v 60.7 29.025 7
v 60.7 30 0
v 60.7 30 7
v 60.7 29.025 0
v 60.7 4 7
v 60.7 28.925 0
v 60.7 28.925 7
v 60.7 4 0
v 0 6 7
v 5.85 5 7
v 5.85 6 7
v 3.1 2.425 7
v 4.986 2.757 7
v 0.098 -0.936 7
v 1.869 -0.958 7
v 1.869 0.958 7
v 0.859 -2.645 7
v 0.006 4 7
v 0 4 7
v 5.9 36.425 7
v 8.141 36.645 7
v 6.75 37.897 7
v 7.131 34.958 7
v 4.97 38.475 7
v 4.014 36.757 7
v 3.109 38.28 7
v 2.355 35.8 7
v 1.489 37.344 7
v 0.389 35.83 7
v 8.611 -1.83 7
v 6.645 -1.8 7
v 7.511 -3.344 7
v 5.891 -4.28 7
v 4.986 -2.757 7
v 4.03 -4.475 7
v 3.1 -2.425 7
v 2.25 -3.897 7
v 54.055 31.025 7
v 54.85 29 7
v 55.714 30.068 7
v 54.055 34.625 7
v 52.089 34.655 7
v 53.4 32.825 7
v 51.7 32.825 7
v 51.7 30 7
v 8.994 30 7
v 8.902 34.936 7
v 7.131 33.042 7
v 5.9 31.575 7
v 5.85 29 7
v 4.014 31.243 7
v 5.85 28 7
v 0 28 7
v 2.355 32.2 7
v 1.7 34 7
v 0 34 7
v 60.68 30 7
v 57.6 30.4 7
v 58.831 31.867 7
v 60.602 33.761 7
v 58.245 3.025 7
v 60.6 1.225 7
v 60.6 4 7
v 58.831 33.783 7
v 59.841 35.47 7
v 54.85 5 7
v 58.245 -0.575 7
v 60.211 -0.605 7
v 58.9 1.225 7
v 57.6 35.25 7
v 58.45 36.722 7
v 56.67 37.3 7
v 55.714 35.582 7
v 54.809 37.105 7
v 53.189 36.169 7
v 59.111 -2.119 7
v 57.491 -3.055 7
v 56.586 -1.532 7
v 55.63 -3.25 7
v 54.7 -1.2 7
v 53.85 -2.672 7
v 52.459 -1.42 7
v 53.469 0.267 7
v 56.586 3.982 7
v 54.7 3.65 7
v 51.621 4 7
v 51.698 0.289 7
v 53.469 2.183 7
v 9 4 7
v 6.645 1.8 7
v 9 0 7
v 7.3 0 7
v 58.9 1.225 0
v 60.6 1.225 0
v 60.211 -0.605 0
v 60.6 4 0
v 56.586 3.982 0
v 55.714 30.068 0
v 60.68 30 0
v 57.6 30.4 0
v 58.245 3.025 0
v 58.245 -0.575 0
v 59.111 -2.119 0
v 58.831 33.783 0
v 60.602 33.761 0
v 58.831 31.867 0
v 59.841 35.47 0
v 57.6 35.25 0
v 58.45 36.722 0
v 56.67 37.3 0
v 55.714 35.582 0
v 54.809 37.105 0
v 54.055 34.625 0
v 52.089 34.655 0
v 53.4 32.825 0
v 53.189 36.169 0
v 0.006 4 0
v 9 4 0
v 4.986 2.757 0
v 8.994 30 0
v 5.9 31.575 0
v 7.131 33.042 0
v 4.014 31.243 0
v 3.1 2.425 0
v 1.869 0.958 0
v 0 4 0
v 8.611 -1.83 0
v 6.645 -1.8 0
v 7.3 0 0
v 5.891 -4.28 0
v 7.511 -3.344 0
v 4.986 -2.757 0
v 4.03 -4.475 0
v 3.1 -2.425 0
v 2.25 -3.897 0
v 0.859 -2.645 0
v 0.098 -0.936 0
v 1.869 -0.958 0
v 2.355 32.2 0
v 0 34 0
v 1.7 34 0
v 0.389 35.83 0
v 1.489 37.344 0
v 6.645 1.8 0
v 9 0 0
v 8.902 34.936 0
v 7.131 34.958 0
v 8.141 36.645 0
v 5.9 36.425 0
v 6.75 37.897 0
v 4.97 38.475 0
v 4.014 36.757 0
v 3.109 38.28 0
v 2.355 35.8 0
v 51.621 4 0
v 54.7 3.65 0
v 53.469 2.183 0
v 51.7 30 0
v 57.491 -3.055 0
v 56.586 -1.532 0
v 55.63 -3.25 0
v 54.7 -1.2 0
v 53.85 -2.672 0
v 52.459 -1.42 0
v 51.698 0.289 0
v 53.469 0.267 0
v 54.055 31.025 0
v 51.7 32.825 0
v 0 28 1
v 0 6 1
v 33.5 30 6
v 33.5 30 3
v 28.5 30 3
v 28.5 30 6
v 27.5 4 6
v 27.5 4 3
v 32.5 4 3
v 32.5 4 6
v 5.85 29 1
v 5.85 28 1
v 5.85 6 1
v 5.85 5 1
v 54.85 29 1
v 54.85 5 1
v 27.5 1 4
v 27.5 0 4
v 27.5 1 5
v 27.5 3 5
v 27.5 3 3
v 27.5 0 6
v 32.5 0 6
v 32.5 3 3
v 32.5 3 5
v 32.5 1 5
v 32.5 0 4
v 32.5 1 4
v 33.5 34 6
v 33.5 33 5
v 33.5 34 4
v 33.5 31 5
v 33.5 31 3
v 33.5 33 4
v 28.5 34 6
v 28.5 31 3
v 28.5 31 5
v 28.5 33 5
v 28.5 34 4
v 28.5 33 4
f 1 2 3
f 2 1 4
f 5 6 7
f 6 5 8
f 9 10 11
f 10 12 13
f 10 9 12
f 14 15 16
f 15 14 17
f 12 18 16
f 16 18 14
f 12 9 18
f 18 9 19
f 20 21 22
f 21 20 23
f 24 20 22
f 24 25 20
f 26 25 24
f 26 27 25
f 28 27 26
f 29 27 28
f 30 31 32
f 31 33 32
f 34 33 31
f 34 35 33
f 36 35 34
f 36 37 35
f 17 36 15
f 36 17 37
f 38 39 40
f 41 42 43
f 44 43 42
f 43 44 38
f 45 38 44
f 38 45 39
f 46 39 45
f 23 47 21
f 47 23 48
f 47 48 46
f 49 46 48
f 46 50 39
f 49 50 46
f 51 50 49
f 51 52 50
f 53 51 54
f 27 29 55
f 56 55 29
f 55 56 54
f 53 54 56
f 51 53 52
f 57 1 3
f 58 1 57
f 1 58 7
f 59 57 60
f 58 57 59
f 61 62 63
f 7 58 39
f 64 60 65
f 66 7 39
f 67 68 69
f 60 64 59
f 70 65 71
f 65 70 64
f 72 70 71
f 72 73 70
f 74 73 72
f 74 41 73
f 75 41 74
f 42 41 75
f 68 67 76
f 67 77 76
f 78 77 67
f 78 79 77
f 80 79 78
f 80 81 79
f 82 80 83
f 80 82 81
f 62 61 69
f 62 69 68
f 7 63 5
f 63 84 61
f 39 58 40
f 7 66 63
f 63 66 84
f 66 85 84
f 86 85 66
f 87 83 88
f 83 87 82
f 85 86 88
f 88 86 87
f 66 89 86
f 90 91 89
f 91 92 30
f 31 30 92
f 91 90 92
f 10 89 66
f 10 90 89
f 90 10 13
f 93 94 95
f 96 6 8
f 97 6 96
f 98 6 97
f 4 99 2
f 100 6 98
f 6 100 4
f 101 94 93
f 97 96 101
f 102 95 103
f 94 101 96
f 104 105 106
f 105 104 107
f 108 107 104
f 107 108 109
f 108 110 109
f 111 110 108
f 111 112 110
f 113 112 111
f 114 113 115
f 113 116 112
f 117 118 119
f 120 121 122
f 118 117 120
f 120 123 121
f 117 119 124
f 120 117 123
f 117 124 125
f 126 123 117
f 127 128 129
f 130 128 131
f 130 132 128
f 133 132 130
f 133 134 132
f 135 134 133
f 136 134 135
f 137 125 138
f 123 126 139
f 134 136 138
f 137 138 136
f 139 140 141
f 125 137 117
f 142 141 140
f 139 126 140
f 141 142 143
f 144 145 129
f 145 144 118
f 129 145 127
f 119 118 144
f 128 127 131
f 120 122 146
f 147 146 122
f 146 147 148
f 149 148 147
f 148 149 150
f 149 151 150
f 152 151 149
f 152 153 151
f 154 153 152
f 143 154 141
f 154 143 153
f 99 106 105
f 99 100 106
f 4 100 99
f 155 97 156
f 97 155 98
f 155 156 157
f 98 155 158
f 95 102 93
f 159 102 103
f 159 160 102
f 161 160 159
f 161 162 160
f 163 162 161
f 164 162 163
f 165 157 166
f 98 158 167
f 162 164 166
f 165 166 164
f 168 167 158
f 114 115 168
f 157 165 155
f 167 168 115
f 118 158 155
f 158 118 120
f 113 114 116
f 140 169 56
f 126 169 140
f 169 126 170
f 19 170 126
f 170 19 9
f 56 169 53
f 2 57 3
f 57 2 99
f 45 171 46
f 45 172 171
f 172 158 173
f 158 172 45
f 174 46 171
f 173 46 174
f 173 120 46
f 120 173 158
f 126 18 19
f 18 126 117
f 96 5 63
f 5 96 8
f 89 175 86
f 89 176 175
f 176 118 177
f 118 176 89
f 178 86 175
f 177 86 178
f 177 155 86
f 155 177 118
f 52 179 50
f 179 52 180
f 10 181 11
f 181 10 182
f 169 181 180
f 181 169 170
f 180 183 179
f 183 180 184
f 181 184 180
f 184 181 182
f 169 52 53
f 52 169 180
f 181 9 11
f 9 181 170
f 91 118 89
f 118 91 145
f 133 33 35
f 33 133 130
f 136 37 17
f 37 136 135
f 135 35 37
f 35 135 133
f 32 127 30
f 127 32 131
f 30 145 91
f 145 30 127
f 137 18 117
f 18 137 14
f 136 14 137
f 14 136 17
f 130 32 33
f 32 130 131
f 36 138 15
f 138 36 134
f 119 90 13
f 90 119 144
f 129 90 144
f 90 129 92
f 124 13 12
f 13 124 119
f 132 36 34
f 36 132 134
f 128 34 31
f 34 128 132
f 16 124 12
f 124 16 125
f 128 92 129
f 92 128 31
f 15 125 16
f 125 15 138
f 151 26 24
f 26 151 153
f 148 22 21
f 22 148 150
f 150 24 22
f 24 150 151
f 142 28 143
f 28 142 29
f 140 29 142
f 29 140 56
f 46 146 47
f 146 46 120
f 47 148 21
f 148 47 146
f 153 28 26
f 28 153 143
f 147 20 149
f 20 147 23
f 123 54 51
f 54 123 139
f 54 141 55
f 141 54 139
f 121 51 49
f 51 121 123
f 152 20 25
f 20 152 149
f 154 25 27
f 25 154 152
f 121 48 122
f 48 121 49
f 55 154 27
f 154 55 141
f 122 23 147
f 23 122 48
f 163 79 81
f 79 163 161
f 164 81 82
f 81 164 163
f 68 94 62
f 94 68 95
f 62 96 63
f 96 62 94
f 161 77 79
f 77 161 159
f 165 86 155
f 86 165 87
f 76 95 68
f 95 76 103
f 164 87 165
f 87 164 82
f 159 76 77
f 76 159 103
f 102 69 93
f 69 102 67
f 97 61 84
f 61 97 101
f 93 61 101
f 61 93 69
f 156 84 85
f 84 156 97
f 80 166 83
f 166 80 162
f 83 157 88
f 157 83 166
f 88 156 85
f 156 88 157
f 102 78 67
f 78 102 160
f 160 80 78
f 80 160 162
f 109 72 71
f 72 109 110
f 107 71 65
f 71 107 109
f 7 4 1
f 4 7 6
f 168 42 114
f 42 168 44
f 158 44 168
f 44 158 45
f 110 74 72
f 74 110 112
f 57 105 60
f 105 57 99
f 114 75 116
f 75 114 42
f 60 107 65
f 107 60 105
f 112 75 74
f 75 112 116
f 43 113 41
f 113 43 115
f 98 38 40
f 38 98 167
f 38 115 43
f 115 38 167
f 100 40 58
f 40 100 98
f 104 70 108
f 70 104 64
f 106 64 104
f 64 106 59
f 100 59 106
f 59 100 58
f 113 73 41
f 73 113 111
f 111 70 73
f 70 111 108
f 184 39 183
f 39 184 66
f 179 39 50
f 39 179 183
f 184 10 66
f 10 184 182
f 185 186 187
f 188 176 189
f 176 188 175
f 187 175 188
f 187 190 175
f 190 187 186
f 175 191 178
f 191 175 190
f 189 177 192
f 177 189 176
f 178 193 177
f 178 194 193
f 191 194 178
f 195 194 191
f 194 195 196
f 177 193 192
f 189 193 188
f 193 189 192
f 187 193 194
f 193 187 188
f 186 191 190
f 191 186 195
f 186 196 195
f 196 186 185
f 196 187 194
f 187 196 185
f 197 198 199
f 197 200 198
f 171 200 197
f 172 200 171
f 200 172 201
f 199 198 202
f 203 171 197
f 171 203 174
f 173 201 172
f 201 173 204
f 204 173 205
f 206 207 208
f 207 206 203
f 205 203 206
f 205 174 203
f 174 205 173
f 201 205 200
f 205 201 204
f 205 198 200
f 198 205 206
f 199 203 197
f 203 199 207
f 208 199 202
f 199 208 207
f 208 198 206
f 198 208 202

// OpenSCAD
module holderPart(holderLength) {
    holderHeight = 7;
    /* Distanz von Lochmittelpunkt zur geraden Kante
     * = translationY + cubeY
     */
    difference() {
        hull() {
            cylinder(h = holderHeight, d = 9.0);
            translate([-4.5, 3 + holderLength, 0]) cube([9, 0.1, holderHeight]);
        }
        cylinder(h = holderHeight, d = 5.6); // Loch
    }
}

module basePlate(basePlateHoleWidth, basePlateHoleDepth, basePlateHoleHeight) {
    difference() {
        cube([basePlateLength, basePlateDepth, basePlateHeight]);
        // connectorSpace
        translate([0, 2, 1]) cube([(basePlateLength - basePlateHoleWidth) / 2, 22, basePlateHoleHeight]);
    }
}

module strapHolder() {
    length = 5;
    depth = 3;
    height = 3;
    cube([length, 1, height]);
    translate([0, 1, height-1]) cube([length, depth, 1]);
    translate([0, depth, height-2]) cube([length, 1, 1]);
}

module main() {
    basePlateAlignY = 4;
    basePlateHoleWidth = 49.0;
    basePlateHoleDepth = 24.0;
    basePlateHoleHeight = 6;
    difference() {
        union() {
            translate([0, basePlateAlignY, 0]) basePlate(basePlateHoleWidth, basePlateHoleDepth, basePlateHoleHeight);
            
            // mid-back left
            translate([4.5, 0, 0]) holderPart(holderLengthFront);
            // mid-back right
            translate([4.5, innerSpacerBoltDistance, 0]) rotate(180) holderPart(holderLengthFront);

            // back left
            translate([56.1, innerToOuterSpacerBoltPositionDifferenceY, 0]) holderPart(holderLengthBack);
            // back right
            translate([56.2, outerSpacerBoltDistance + innerToOuterSpacerBoltPositionDifferenceY, 0]) rotate(180) holderPart(holderLengthBack);
        }
        translate([(basePlateLength - basePlateHoleWidth) / 2, basePlateAlignY + 1, 1]) {
            cube([basePlateHoleWidth, basePlateHoleDepth, basePlateHoleHeight]);
        }
    }
    translate([32.5, 4, 3]) rotate(180) strapHolder();
    translate([28.5, 30, 3]) strapHolder();
}

basePlateLength = 60.7;
basePlateDepth = 26.0;
basePlateHeight = 7;

innerSpacerBoltDistance = 34;
outerSpacerBoltDistance = 31.6;
innerToOuterSpacerBoltPositionDifferenceY = 1.225;

holderLengthFront = 1.3;
holderLengthBack = 0.8;

main();
